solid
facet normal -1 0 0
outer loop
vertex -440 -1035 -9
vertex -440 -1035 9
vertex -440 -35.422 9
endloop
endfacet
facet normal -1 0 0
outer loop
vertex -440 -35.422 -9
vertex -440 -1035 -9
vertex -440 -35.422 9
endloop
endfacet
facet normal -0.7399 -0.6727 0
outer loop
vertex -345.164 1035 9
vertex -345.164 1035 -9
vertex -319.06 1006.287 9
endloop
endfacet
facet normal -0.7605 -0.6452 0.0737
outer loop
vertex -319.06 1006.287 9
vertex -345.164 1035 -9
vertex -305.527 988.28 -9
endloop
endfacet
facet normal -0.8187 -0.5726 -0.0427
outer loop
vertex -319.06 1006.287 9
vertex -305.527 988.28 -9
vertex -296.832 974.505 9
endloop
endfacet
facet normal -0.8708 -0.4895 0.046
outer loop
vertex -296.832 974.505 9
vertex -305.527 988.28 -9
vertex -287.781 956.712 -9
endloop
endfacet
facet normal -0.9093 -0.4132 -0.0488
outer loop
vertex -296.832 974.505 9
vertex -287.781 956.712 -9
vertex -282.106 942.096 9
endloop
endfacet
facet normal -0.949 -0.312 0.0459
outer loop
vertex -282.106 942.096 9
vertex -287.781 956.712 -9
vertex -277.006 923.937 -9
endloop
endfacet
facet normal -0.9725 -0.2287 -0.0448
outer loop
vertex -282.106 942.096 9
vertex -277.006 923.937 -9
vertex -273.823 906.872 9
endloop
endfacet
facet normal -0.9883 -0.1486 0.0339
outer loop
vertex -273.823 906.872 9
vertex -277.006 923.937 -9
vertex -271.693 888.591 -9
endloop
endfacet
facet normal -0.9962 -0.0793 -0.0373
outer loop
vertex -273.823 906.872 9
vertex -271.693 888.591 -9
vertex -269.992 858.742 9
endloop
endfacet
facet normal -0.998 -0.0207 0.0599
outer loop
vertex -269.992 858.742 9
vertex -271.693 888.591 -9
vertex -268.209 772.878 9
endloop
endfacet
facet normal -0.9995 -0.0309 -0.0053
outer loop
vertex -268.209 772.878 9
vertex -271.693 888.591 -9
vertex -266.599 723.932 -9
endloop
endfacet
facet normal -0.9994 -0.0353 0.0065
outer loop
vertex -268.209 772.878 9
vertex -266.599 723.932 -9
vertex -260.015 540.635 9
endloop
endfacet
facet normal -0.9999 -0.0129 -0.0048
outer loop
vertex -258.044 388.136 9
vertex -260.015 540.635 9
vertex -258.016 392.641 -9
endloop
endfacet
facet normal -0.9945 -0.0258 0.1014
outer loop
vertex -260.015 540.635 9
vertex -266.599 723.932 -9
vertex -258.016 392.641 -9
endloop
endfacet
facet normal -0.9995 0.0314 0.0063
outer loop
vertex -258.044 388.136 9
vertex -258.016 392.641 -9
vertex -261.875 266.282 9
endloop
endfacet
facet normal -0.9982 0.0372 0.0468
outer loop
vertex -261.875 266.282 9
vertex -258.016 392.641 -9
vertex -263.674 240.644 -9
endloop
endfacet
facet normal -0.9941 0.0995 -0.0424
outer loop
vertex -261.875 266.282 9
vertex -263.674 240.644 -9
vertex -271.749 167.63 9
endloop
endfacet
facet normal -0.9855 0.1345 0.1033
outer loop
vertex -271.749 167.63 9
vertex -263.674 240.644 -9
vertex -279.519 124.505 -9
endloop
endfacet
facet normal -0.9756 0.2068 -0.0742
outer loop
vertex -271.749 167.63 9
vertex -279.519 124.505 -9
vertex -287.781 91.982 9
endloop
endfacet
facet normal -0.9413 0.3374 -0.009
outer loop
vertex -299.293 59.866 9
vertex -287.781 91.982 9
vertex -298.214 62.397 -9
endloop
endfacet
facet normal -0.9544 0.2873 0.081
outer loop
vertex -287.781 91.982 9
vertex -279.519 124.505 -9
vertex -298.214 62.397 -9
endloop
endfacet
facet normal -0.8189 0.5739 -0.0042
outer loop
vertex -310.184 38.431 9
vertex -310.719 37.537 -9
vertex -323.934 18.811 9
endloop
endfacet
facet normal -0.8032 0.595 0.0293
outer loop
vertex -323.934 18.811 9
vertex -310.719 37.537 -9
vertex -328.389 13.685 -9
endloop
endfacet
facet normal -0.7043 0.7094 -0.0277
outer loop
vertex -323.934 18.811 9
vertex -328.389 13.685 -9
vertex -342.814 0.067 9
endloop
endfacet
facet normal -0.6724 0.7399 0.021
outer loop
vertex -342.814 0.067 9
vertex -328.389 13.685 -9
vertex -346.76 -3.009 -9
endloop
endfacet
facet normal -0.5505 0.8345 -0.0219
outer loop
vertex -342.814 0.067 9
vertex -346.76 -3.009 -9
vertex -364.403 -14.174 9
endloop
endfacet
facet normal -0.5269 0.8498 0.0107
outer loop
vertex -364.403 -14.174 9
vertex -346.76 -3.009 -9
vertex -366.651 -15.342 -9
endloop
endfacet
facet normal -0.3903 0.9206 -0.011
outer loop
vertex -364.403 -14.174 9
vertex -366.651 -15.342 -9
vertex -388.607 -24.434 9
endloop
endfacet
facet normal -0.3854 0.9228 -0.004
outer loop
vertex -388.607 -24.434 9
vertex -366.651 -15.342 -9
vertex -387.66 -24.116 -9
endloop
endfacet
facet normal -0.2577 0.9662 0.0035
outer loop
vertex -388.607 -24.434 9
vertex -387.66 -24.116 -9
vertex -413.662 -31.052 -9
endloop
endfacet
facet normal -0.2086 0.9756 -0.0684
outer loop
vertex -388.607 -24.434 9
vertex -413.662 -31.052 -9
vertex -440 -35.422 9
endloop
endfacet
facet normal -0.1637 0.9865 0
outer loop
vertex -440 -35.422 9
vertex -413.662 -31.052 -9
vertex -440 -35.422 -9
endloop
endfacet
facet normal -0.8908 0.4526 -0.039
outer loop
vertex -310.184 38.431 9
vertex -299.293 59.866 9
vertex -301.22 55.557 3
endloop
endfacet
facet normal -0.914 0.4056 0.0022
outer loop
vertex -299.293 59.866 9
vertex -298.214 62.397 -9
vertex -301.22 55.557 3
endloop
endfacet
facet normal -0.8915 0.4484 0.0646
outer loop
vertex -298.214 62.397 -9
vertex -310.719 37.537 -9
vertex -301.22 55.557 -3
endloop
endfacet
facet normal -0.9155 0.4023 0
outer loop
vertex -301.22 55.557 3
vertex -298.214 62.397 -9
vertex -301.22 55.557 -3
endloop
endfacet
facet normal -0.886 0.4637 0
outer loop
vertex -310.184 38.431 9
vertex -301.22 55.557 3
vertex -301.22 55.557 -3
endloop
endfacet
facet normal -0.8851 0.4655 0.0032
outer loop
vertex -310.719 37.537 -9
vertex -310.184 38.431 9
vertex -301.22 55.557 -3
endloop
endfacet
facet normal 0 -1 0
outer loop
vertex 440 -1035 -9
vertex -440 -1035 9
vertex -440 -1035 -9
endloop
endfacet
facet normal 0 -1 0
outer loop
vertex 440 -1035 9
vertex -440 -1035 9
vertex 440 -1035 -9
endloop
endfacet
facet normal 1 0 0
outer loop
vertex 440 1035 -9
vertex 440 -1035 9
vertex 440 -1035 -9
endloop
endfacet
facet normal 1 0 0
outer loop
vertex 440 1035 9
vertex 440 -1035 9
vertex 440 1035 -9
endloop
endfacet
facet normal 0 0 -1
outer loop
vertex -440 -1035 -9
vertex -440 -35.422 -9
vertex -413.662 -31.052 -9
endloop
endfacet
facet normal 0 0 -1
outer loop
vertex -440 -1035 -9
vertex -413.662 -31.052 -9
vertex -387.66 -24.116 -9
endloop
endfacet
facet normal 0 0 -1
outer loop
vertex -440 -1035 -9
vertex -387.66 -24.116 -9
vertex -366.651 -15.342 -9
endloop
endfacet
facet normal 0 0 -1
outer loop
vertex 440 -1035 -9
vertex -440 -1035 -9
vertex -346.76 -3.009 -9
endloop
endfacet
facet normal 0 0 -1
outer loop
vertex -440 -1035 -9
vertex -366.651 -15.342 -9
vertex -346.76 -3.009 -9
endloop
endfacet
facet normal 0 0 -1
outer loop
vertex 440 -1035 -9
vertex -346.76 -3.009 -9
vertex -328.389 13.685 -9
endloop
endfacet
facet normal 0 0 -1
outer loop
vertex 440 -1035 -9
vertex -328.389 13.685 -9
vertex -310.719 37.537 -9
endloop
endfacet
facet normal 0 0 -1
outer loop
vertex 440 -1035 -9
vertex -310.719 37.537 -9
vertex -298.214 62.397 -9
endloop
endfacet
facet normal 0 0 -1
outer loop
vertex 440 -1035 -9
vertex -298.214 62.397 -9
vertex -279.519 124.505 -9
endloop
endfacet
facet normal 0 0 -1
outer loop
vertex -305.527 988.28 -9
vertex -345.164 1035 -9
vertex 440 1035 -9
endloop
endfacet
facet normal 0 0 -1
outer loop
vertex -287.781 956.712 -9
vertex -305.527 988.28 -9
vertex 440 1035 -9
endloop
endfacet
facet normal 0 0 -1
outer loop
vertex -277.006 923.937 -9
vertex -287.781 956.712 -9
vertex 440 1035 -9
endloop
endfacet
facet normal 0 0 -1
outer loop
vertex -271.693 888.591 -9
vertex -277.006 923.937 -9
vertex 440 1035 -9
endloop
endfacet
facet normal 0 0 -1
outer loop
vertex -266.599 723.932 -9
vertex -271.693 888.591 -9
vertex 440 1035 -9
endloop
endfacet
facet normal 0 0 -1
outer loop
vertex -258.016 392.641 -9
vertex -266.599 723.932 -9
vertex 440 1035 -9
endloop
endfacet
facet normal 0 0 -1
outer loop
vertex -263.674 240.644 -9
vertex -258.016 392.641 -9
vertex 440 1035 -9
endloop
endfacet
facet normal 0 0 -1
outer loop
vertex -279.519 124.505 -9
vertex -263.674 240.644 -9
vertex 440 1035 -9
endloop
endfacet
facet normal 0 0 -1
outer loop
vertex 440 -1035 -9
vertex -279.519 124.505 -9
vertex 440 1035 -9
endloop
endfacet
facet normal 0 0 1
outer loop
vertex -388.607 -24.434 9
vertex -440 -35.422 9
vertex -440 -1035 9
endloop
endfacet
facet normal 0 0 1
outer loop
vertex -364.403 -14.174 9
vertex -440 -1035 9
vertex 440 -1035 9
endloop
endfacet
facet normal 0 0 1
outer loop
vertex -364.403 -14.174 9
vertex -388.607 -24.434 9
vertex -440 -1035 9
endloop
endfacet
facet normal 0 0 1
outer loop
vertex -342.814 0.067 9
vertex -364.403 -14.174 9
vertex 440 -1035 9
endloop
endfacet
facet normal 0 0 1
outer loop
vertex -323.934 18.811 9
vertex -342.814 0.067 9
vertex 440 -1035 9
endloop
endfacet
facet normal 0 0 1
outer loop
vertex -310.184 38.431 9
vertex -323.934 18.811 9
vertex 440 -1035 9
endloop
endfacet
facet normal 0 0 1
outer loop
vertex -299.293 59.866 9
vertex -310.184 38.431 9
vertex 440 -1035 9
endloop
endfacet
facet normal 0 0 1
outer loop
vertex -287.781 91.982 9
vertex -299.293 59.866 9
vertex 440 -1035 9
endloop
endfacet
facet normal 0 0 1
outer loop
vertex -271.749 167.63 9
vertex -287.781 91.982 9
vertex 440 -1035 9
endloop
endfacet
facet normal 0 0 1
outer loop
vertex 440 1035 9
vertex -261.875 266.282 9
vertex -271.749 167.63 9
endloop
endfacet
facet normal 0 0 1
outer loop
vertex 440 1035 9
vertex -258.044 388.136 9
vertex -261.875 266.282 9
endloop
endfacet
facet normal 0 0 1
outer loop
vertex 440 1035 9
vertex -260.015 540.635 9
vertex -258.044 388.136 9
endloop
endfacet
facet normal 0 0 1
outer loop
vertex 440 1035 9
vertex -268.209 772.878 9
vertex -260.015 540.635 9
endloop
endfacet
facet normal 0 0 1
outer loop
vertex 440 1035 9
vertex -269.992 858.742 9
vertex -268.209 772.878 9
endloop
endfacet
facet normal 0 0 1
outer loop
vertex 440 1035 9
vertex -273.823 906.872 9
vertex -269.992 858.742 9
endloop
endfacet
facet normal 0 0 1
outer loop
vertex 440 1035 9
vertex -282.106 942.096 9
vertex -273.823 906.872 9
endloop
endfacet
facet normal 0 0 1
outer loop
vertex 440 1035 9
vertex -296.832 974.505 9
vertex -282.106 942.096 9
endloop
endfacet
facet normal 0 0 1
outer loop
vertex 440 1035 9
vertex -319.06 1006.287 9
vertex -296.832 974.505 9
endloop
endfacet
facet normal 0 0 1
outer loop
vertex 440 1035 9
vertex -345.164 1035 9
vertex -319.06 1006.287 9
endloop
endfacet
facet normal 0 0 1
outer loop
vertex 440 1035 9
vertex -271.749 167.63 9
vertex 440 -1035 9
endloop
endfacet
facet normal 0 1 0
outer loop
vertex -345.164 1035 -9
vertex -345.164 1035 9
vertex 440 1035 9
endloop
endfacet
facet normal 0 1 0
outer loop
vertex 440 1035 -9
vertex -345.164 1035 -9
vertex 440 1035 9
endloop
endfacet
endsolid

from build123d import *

# Parameters (mm, degrees)
F0_W     = 880
F0_H     = 2070
F1_DEPTH = 9
F3_DEPTH = 25


with BuildPart() as f1:
    # F0 (on Top) → F1 (new body, symmetric)
    with BuildSketch(Plane.XY):
        Rectangle(F0_W, F0_H)
    extrude(amount=F1_DEPTH, both=True)

    # F2 (on face) → F3 (cut)
    with BuildSketch(Plane(origin=(0, 0, -9), x_dir=(1, 0, 0), z_dir=(0, 0, -1))):
        with BuildLine():
            Line((-440, -1035), (-345.1635837555, -1035))
            add(Edge.make_bspline(
                [(-345.1635837555, -1035), (-264.3917672013, -953.7238384219), (-282.7083415362, -828.3101050302), (-218.7463566298, -15.6652863678), (-387.7181019401, 28.374090669), (-440, 35.421974957)],
                knots=[0, 0, 0, 0, 0.2848252576, 0.7699167532, 1, 1, 1, 1], degree=3))
            Line((-440, 35.421974957), (-440, -1035))
        make_face()
    extrude(amount=-F3_DEPTH, mode=Mode.SUBTRACT)


solid = f1.part
